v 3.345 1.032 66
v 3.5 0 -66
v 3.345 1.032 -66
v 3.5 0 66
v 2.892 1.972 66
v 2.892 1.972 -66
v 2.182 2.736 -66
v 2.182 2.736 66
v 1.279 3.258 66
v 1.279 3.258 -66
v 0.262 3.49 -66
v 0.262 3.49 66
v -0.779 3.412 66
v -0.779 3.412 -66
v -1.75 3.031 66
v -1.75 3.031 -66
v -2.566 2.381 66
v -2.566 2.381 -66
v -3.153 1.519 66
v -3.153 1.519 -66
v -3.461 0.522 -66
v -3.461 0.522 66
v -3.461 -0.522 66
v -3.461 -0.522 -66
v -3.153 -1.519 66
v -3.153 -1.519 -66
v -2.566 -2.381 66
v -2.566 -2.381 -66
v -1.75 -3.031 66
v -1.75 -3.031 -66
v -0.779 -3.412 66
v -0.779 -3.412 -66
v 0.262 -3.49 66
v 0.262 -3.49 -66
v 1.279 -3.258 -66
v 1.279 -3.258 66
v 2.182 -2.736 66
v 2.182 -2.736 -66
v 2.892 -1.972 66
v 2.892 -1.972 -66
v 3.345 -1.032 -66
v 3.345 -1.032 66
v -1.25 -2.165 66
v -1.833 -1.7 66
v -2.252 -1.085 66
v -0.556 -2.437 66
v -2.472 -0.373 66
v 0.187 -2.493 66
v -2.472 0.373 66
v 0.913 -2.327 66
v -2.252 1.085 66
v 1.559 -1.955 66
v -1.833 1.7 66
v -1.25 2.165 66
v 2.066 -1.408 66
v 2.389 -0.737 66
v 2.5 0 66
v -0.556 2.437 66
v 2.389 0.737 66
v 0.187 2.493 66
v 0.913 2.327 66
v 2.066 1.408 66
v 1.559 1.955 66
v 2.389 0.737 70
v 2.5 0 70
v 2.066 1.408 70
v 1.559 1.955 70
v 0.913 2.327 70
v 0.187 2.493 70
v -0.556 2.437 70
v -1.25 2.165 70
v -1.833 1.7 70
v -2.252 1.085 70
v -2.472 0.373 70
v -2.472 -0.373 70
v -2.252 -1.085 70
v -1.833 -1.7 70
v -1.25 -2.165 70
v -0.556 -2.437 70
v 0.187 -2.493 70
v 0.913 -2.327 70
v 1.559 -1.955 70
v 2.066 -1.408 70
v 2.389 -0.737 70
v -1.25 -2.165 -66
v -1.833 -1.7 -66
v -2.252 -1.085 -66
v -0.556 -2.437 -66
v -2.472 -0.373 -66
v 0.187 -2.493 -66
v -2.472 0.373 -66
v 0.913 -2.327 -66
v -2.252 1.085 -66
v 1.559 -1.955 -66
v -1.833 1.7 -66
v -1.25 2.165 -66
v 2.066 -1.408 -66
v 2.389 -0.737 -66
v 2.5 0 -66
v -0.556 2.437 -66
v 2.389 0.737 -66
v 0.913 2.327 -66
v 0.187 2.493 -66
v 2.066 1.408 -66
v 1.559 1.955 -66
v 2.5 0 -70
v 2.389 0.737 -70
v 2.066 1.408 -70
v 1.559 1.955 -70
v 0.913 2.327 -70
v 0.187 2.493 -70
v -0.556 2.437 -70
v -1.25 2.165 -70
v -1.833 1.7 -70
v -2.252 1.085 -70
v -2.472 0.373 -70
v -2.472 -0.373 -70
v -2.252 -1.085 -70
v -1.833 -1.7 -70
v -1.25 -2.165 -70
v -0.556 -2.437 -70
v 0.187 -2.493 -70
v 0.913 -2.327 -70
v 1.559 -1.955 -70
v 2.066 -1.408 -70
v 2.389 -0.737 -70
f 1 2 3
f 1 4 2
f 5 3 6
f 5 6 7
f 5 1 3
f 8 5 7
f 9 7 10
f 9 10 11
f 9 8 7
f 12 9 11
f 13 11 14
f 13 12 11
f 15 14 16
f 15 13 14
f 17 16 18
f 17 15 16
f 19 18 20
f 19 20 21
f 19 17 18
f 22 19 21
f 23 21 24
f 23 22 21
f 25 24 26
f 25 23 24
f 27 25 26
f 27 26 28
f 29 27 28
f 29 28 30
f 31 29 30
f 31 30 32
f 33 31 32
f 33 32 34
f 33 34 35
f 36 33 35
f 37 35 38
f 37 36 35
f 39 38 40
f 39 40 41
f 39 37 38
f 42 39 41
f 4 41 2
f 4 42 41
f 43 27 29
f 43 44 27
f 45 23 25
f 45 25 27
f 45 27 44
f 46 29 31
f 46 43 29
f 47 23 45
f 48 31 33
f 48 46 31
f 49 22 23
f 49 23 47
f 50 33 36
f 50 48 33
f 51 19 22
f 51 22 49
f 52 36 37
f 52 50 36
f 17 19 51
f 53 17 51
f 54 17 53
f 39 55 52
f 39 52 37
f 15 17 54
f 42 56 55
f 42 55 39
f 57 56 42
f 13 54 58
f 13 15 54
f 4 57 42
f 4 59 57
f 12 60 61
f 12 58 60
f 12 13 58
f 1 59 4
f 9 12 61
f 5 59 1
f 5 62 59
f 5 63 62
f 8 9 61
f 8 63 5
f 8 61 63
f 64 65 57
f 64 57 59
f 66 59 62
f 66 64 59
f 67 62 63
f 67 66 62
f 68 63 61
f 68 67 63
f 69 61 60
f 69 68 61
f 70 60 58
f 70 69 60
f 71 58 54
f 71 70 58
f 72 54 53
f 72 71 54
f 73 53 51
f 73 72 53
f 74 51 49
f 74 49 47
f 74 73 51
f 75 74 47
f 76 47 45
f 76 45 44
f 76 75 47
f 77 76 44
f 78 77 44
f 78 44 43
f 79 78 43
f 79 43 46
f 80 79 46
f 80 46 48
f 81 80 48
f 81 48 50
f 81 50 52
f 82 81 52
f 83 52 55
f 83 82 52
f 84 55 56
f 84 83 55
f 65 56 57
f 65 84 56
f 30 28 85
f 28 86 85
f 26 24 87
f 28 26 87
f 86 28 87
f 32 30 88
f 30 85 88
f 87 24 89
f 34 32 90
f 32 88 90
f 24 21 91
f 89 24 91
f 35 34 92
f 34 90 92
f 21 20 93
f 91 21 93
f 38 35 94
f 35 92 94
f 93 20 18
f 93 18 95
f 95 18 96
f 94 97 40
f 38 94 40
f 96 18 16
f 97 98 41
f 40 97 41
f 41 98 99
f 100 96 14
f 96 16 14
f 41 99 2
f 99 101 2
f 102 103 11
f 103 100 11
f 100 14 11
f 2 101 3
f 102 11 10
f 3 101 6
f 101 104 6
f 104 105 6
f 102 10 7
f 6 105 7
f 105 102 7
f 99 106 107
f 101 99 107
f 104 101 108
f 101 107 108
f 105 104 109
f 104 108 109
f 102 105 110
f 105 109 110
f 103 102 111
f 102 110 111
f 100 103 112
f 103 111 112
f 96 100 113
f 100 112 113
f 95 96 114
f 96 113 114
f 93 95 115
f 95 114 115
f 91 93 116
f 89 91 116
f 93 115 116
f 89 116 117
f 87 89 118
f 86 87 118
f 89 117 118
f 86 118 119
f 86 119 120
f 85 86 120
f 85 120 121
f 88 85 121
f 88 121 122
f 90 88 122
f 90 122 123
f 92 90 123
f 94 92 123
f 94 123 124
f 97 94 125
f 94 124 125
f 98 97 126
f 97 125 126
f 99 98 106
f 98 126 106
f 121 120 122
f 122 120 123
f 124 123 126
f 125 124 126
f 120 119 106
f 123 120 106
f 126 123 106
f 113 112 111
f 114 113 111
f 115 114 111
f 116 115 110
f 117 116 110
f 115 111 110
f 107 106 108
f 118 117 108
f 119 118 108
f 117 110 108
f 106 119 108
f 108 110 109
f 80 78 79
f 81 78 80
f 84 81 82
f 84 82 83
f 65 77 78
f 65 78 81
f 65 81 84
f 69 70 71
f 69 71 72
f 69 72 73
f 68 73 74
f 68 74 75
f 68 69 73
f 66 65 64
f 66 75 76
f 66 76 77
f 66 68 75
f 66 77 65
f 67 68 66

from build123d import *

# Parameters (mm, degrees)
F0_R     = 3.5
F1_DEPTH = 70
F2_R     = 3.5
F2_R_2   = 2.5
F3_DEPTH = 4


# Not quite as in the source:
# - a pattern or mirror of a feature is missing from the dataset's text; its kind, count and spacing are read off the source's solid


with BuildPart() as f1:
    # F0 (on Top) → F1 (new body, symmetric)
    with BuildSketch(Plane.XY):
        Circle(F0_R)
    extrude(amount=F1_DEPTH, both=True)

    # F2 (on face) → F3 (cut)
    with BuildSketch(Plane.XY.offset(70)):
        Circle(F2_R)
        Circle(F2_R_2, mode=Mode.SUBTRACT)
    f3 = extrude(amount=-F3_DEPTH, mode=Mode.SUBTRACT)

    # F3_copies: F3 across plane
    add(f3.mirror(Plane(origin=(0, 0, 0), x_dir=(-1, 0, 0), z_dir=(0, 0, -1))), mode=Mode.SUBTRACT)


solid = f1.part
